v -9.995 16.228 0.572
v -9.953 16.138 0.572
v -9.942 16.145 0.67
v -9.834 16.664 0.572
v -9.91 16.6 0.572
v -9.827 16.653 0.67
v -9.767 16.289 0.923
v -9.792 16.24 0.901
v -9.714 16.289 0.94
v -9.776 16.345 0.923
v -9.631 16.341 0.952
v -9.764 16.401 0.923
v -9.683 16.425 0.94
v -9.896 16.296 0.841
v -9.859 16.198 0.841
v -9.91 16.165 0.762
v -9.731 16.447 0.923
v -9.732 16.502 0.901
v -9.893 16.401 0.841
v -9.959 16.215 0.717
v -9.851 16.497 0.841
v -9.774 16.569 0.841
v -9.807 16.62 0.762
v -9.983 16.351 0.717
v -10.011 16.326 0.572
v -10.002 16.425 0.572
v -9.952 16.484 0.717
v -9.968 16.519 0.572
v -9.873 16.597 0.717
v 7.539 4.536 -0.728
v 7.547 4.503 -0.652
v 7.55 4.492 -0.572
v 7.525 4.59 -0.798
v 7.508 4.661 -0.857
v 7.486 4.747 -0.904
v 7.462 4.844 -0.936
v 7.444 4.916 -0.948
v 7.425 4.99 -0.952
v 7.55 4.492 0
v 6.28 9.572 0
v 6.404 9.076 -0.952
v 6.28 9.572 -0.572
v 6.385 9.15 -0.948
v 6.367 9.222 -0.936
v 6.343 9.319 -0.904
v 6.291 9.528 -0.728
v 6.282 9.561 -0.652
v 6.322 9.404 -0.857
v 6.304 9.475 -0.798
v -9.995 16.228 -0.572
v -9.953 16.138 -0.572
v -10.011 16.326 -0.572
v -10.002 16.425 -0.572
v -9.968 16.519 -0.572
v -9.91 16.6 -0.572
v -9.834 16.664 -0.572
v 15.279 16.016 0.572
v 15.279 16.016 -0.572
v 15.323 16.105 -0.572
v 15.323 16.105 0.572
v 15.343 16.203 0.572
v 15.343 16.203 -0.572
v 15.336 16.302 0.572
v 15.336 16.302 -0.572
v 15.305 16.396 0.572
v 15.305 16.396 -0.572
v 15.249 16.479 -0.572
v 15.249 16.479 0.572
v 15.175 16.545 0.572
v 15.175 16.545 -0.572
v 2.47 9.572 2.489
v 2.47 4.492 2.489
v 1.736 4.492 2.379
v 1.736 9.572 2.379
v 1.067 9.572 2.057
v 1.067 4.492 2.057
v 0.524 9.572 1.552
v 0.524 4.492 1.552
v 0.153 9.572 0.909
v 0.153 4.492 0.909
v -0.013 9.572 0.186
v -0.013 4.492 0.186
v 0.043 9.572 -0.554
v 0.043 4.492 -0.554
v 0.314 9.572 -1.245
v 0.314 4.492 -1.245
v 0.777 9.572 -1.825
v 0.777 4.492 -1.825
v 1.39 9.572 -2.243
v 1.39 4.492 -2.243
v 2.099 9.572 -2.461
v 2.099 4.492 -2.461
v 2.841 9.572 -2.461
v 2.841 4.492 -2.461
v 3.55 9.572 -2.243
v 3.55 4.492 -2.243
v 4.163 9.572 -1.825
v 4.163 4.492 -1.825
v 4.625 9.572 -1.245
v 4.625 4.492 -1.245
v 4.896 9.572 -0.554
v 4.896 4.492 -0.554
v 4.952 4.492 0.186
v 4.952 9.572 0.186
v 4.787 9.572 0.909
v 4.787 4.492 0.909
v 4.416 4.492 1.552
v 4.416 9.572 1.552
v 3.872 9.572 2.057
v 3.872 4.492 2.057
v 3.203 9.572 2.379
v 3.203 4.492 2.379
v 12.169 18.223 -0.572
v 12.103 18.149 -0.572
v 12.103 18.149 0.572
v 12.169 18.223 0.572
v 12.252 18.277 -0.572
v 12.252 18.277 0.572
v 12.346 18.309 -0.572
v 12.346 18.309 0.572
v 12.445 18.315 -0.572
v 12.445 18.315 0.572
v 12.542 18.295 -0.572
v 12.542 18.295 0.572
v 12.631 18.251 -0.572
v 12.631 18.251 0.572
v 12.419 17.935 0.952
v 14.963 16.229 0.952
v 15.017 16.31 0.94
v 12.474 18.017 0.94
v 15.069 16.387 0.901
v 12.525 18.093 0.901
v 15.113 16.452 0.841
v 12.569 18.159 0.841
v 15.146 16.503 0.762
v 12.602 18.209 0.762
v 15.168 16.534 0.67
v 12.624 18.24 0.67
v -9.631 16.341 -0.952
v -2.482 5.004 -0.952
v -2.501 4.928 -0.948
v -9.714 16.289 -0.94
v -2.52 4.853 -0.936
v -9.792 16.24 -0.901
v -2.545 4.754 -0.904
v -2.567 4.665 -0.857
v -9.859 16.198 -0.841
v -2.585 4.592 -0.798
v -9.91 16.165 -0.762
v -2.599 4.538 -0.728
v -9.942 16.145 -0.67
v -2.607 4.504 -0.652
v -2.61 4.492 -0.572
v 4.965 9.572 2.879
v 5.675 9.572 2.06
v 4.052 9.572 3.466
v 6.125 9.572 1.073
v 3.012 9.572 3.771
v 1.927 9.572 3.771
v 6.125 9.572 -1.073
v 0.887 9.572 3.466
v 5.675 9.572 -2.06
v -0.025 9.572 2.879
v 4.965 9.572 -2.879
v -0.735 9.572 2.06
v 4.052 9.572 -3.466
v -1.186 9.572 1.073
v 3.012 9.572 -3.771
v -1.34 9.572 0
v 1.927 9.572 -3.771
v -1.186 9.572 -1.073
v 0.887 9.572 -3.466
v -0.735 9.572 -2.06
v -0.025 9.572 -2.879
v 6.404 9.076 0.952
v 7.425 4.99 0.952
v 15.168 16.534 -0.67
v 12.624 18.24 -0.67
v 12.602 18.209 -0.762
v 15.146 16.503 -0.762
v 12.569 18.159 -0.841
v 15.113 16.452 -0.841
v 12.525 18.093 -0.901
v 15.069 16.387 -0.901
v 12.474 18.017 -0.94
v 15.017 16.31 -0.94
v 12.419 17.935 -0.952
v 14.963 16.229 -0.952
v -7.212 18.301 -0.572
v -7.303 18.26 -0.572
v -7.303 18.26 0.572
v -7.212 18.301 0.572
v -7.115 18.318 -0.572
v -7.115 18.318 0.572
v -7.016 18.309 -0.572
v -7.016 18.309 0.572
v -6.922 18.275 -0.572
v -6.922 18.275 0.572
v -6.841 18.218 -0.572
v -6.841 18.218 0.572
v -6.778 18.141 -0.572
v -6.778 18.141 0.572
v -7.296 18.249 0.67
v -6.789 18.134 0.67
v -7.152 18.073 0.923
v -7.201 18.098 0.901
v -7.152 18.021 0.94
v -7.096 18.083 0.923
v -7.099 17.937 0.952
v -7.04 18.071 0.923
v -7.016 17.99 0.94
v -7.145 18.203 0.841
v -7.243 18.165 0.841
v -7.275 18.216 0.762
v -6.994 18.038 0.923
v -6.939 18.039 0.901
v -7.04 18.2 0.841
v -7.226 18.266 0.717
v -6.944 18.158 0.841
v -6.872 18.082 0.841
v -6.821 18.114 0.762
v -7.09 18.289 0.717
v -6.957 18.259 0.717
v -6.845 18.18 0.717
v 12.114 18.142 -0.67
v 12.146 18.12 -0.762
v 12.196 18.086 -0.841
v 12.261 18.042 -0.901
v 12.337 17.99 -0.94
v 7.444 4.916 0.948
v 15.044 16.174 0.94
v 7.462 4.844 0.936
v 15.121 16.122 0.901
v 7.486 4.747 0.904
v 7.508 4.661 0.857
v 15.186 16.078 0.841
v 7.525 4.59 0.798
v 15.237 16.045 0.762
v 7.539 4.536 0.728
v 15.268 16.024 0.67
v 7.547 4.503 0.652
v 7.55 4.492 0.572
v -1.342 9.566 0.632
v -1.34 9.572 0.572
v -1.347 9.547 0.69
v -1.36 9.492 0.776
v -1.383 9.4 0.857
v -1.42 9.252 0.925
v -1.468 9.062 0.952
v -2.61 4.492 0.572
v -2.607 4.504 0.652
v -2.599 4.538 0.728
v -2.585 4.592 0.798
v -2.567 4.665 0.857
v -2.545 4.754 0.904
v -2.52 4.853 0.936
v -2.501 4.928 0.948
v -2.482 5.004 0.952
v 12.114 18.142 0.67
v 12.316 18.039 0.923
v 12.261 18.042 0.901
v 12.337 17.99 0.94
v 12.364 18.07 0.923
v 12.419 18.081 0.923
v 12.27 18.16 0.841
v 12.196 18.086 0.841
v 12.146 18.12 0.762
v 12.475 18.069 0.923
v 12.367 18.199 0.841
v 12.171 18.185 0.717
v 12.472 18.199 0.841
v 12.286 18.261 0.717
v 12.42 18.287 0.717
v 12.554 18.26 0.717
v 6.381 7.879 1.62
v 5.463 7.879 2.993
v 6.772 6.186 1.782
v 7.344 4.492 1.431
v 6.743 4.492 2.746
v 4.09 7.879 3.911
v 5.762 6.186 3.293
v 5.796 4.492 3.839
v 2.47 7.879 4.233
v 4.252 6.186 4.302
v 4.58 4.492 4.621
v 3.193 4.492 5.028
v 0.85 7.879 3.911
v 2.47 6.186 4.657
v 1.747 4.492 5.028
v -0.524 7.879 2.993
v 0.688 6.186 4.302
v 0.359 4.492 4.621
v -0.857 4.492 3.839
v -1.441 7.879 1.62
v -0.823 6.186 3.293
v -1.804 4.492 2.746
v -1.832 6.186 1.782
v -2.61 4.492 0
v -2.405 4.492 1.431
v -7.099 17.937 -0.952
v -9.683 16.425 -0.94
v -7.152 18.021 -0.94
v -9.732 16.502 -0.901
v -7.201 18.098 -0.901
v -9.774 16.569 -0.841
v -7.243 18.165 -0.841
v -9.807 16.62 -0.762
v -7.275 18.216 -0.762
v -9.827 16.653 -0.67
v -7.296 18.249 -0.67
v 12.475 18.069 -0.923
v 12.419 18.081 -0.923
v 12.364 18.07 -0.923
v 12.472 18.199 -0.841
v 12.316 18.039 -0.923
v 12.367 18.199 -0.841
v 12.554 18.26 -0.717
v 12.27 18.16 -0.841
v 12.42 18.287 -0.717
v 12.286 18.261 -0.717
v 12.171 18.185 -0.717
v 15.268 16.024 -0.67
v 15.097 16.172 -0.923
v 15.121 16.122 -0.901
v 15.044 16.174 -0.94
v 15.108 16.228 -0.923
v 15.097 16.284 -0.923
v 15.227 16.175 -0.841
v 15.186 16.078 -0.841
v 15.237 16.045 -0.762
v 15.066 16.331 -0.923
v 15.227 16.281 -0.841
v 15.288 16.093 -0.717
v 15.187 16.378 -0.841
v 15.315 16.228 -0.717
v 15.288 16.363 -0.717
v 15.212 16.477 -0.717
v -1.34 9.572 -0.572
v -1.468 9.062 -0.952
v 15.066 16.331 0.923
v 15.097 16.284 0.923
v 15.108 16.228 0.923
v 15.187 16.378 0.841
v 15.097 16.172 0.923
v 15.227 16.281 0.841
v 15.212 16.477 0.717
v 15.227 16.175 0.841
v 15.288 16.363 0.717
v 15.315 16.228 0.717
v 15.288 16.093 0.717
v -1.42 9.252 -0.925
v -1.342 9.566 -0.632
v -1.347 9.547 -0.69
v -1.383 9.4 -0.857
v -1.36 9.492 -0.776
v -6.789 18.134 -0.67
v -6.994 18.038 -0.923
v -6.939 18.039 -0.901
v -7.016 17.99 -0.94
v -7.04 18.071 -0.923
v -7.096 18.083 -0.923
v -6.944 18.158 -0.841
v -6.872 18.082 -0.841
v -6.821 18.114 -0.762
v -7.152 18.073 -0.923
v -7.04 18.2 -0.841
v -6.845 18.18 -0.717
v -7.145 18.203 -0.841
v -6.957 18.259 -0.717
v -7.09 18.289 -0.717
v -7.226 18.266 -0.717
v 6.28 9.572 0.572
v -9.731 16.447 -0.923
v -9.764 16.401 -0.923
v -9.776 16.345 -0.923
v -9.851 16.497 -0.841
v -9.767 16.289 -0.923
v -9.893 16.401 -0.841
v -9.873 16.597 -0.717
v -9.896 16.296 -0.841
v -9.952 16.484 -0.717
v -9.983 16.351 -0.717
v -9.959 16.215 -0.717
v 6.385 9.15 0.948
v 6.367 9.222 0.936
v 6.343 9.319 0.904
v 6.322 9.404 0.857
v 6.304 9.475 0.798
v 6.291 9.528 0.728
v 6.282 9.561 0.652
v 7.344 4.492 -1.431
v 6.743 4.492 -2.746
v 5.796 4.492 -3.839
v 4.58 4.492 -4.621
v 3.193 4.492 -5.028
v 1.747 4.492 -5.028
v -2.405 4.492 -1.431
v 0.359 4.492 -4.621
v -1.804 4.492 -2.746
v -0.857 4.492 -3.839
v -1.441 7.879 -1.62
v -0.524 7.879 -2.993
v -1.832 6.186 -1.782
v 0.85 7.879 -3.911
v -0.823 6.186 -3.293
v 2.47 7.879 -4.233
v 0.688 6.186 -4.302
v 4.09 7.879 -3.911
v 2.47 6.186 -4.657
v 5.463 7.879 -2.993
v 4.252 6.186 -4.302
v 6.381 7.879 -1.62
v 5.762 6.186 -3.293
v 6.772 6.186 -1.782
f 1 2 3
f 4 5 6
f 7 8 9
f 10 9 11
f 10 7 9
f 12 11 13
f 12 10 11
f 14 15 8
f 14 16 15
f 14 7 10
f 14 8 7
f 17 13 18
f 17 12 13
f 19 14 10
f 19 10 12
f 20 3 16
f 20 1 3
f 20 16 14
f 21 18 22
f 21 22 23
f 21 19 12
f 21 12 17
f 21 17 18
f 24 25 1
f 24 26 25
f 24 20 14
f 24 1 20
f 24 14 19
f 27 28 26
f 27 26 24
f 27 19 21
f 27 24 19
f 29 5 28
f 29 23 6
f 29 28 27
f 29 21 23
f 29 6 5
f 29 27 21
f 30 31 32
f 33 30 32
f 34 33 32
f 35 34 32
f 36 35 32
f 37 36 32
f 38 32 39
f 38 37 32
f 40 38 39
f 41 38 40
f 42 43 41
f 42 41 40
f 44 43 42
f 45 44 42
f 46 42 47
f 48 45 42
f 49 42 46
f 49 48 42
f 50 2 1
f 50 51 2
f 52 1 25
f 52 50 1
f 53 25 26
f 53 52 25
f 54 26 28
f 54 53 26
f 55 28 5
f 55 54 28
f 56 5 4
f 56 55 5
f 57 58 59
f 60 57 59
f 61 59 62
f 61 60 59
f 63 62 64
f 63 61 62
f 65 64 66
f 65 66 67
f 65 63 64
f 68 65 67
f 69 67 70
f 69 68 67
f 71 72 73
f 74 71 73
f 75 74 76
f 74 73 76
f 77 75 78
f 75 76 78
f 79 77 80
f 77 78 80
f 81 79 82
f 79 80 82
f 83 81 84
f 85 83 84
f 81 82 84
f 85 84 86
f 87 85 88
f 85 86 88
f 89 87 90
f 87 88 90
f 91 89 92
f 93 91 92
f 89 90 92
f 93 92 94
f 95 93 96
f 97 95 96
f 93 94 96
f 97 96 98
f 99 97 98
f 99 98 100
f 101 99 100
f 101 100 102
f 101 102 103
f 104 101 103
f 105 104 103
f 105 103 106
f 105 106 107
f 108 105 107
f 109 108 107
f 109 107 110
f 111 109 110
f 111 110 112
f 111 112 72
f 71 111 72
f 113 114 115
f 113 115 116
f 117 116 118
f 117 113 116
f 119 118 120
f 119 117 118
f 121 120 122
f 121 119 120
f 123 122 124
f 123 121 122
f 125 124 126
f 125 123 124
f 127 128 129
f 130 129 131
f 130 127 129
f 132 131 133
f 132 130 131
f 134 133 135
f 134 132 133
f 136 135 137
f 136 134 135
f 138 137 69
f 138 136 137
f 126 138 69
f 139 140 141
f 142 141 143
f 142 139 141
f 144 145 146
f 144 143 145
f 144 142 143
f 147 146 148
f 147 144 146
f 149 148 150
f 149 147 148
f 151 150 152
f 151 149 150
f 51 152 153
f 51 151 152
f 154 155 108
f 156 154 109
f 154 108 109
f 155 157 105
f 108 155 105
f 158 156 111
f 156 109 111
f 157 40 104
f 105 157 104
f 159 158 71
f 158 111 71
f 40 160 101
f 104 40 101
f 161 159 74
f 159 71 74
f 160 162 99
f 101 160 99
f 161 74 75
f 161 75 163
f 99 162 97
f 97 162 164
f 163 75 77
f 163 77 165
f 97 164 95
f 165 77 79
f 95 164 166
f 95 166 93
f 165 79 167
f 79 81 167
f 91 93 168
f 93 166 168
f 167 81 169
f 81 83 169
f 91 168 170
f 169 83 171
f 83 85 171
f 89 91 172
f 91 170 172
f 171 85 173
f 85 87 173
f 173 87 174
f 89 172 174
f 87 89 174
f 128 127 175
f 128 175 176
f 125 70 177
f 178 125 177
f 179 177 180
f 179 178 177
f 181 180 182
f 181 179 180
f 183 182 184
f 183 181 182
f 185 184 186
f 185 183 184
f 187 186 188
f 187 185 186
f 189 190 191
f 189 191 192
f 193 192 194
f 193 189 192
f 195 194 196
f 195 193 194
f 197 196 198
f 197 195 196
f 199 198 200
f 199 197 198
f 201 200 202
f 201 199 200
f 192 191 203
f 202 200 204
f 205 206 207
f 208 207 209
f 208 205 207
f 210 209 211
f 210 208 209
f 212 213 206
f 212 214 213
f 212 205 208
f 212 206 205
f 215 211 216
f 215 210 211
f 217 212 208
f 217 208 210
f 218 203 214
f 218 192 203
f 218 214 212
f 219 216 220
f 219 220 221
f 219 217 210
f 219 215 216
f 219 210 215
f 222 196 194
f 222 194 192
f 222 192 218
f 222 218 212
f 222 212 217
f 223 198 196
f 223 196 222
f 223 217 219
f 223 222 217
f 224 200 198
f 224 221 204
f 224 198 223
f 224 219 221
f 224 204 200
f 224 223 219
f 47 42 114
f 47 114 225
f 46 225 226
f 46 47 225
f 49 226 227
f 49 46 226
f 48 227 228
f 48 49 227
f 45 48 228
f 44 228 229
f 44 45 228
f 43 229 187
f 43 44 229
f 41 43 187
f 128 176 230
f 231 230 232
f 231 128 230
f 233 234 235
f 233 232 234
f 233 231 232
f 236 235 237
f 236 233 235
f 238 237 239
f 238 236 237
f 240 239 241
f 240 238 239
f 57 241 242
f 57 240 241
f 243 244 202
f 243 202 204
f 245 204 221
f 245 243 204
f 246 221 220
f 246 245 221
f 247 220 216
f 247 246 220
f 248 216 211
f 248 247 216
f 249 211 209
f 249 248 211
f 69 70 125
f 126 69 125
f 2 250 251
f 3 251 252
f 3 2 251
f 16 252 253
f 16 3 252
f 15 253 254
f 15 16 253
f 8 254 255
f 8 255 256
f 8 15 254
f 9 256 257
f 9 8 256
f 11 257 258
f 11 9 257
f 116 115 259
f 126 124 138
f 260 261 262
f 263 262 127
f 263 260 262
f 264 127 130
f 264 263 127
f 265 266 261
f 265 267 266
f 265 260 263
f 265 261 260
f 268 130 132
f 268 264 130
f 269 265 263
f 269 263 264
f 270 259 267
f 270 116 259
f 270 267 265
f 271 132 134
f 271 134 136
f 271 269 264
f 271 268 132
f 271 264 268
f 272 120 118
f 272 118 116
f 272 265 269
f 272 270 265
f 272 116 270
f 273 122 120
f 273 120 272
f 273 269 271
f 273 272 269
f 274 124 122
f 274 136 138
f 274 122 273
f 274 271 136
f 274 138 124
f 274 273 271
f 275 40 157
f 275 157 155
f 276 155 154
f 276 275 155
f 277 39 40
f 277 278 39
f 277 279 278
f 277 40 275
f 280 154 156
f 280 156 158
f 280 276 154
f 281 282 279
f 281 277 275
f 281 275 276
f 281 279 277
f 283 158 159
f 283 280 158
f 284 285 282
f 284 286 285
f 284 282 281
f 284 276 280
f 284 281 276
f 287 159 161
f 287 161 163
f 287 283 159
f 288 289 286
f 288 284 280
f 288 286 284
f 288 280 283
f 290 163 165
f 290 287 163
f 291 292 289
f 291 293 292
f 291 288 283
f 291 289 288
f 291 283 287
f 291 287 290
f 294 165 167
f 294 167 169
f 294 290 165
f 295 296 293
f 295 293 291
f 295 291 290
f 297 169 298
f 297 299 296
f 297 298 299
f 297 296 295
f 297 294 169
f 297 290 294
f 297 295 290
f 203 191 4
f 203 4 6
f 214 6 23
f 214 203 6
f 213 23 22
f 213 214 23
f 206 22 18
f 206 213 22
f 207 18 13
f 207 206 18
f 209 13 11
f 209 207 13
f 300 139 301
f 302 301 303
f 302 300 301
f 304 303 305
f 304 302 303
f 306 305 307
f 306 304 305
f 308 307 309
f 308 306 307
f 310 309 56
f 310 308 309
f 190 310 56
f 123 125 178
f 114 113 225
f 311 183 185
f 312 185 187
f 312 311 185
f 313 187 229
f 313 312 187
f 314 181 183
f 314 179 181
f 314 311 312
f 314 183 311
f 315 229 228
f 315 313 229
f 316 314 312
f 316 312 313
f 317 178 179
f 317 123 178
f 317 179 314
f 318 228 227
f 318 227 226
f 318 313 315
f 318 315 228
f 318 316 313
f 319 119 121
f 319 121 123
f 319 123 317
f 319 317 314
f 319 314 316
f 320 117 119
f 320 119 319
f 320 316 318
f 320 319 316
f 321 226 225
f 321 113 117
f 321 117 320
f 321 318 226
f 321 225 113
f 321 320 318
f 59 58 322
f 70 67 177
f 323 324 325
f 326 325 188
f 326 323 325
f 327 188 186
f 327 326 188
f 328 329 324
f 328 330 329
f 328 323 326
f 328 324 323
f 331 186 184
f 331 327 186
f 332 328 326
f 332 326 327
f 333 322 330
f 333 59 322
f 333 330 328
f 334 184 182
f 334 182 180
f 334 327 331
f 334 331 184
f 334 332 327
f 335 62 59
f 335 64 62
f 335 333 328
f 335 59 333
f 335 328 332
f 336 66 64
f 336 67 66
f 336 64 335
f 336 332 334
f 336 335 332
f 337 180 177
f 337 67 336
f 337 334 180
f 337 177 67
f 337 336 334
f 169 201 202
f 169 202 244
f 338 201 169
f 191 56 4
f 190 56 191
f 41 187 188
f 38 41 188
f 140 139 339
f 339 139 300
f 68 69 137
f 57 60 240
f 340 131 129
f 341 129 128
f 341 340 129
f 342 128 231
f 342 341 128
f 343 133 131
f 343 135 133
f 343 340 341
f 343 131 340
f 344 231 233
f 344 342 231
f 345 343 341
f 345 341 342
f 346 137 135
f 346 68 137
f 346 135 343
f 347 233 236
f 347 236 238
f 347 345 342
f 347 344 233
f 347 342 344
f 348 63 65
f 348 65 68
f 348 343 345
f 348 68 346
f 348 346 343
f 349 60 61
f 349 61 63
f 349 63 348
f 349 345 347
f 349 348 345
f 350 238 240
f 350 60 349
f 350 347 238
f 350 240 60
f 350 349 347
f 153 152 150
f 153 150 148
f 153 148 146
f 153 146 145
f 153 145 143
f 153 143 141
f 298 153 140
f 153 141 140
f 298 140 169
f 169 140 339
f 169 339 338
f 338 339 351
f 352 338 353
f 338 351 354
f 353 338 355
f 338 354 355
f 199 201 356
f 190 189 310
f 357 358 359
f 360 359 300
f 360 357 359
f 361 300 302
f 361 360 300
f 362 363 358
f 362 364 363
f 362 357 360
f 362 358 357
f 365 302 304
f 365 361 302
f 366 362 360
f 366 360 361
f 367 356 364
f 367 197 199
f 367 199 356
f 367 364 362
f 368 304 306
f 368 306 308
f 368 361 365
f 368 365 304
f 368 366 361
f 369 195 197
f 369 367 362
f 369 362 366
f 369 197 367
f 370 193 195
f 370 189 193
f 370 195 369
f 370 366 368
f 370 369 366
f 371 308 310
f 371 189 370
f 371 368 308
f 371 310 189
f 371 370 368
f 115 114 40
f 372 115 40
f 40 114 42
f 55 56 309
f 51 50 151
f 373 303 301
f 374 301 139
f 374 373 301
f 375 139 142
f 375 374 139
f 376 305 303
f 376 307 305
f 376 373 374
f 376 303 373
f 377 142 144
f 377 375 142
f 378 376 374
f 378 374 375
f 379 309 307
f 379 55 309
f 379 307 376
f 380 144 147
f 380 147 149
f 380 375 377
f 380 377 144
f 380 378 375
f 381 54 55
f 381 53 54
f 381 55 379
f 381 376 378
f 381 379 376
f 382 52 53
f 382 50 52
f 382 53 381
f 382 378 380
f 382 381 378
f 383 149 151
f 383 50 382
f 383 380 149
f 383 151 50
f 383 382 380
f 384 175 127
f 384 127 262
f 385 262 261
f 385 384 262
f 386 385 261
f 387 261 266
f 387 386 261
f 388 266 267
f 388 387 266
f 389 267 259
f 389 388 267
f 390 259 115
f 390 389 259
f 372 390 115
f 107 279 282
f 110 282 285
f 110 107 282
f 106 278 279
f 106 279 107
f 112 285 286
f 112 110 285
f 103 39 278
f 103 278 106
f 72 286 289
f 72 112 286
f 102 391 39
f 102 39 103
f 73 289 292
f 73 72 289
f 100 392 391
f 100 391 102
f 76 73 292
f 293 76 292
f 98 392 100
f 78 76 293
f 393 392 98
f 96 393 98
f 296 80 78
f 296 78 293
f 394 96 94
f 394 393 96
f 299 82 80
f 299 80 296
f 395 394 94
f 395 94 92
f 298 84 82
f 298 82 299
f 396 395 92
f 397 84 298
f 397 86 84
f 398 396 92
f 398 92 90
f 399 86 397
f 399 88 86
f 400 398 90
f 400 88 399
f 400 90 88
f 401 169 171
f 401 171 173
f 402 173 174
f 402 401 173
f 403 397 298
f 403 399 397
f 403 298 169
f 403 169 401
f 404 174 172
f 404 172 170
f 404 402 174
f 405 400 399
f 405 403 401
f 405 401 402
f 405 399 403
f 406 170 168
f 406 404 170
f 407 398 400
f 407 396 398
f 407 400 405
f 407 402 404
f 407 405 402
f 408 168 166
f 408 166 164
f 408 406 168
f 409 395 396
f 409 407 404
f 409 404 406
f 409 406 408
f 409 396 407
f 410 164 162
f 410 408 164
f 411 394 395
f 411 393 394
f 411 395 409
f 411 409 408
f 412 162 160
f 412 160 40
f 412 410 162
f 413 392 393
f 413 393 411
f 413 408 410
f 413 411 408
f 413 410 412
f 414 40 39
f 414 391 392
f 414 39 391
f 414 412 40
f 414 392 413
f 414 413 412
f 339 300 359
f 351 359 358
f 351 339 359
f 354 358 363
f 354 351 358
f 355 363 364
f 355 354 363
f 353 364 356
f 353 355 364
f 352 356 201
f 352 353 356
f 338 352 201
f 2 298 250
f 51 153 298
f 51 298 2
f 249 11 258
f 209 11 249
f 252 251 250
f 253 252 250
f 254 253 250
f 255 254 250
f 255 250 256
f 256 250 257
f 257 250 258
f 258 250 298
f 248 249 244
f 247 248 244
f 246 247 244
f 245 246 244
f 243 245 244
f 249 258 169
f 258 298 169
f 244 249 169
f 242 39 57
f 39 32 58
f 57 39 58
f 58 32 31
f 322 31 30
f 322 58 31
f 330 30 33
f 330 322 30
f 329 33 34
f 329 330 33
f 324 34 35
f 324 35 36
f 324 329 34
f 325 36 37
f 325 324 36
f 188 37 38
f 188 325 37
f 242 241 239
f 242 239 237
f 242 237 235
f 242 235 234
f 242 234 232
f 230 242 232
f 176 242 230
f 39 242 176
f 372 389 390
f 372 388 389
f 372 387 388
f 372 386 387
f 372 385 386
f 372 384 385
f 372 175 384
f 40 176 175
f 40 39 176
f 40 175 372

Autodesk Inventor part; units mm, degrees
ref_plane "YZ Plane" through (0, 0, 0) normal (1, 0, 0) x (0, 1, 0)
ref_plane "XZ Plane" through (0, 0, 0) normal (0, 1, 0) x (-1, 0, 0)
ref_plane "XY Plane" through (0, 0, 0) normal (0, 0, 1) x (1, 0, 0)
sketch "Sketch1" plane through (0, 0, 0) normal (0, 0, 1) x (1, 0, 0)
  line L0 (2.4697, 4.4922) -> (-2.6103, 4.4922)
  line L1 (-2.6103, 4.4922) -> (-1.3403, 9.5722)
  line L2 (-1.3403, 9.5722) -> (2.4697, 9.5722)
  line L3 (2.4697, 9.5722) -> (2.4697, 4.4922)
  line L4 (7.5497, 4.4922) -> (6.2797, 9.5722)
  line L5 (-2.6103, 4.4922) -> (-10.1562, 16.4603)
  line L6 (-10.1562, 16.4603) -> (-6.9812, 18.4622)
  line L7 (-6.9812, 18.4622) -> (-1.3403, 9.5722)
  line L8 (7.5497, 4.4922) -> (15.4912, 16.3327)
  line L9 (15.4912, 16.3327) -> (12.3162, 18.4622)
  line L10 (12.3162, 18.4622) -> (6.2797, 9.5722)
  dimension "d0" = 3.175
  dimension "d1" = 3.175
  dimension "d3" = 3.81
  dimension "d4" = 5.08
  dimension "d5" = 5.08
  dimension "d6" = 5.08
  dimension "d8" = 13.97
  dimension "d9" = 13.97
revolve "Revolution1" add sketch "Sketch1" angle 360 about axis through (2.4697, 9.5722, 0) along (0, -1, 0) contours L0 L1 L2 L3
extrude "Extrusion1" add sketch "Sketch1" along normal mid plane 1.905 contours L5 L6 L7 L1
extrude "Extrusion2" add sketch "Sketch1" along normal mid plane 1.905 contours L4 L10 L9 L8
fillet "Fillet1" radius 0.381 16 edges at (-6.3833, 10.4762, 0.9525) (-4.1608, 14.0172, 0.9525) (-4.1608, 14.0172, -0.9525) (9.2979, 14.0172, 0.9525) (12.3162, 18.4622, 0) (9.2979, 14.0172, -0.9525) (13.9037, 17.3974, -0.9525) (13.9037, 17.3974, 0.9525) (15.4912, 16.3327, 0) (11.5204, 10.4124, -0.9525) (11.5204, 10.4124, 0.9525) (-8.5687, 17.4612, 0.9525) (-10.1562, 16.4603, 0) (-8.5687, 17.4612, -0.9525) (-6.9812, 18.4622, 0) (-6.3833, 10.4762, -0.9525)
hole "Hole1" at (2.4697, 9.5722, 0) direction (0, -1, 0) diameter 4.9784 depth 19.05 tip angle 118 thread size "1/4-20 UNC" class "2B" standard "ANSI Unified Screw Threads"
properties part number "HW-00011"
